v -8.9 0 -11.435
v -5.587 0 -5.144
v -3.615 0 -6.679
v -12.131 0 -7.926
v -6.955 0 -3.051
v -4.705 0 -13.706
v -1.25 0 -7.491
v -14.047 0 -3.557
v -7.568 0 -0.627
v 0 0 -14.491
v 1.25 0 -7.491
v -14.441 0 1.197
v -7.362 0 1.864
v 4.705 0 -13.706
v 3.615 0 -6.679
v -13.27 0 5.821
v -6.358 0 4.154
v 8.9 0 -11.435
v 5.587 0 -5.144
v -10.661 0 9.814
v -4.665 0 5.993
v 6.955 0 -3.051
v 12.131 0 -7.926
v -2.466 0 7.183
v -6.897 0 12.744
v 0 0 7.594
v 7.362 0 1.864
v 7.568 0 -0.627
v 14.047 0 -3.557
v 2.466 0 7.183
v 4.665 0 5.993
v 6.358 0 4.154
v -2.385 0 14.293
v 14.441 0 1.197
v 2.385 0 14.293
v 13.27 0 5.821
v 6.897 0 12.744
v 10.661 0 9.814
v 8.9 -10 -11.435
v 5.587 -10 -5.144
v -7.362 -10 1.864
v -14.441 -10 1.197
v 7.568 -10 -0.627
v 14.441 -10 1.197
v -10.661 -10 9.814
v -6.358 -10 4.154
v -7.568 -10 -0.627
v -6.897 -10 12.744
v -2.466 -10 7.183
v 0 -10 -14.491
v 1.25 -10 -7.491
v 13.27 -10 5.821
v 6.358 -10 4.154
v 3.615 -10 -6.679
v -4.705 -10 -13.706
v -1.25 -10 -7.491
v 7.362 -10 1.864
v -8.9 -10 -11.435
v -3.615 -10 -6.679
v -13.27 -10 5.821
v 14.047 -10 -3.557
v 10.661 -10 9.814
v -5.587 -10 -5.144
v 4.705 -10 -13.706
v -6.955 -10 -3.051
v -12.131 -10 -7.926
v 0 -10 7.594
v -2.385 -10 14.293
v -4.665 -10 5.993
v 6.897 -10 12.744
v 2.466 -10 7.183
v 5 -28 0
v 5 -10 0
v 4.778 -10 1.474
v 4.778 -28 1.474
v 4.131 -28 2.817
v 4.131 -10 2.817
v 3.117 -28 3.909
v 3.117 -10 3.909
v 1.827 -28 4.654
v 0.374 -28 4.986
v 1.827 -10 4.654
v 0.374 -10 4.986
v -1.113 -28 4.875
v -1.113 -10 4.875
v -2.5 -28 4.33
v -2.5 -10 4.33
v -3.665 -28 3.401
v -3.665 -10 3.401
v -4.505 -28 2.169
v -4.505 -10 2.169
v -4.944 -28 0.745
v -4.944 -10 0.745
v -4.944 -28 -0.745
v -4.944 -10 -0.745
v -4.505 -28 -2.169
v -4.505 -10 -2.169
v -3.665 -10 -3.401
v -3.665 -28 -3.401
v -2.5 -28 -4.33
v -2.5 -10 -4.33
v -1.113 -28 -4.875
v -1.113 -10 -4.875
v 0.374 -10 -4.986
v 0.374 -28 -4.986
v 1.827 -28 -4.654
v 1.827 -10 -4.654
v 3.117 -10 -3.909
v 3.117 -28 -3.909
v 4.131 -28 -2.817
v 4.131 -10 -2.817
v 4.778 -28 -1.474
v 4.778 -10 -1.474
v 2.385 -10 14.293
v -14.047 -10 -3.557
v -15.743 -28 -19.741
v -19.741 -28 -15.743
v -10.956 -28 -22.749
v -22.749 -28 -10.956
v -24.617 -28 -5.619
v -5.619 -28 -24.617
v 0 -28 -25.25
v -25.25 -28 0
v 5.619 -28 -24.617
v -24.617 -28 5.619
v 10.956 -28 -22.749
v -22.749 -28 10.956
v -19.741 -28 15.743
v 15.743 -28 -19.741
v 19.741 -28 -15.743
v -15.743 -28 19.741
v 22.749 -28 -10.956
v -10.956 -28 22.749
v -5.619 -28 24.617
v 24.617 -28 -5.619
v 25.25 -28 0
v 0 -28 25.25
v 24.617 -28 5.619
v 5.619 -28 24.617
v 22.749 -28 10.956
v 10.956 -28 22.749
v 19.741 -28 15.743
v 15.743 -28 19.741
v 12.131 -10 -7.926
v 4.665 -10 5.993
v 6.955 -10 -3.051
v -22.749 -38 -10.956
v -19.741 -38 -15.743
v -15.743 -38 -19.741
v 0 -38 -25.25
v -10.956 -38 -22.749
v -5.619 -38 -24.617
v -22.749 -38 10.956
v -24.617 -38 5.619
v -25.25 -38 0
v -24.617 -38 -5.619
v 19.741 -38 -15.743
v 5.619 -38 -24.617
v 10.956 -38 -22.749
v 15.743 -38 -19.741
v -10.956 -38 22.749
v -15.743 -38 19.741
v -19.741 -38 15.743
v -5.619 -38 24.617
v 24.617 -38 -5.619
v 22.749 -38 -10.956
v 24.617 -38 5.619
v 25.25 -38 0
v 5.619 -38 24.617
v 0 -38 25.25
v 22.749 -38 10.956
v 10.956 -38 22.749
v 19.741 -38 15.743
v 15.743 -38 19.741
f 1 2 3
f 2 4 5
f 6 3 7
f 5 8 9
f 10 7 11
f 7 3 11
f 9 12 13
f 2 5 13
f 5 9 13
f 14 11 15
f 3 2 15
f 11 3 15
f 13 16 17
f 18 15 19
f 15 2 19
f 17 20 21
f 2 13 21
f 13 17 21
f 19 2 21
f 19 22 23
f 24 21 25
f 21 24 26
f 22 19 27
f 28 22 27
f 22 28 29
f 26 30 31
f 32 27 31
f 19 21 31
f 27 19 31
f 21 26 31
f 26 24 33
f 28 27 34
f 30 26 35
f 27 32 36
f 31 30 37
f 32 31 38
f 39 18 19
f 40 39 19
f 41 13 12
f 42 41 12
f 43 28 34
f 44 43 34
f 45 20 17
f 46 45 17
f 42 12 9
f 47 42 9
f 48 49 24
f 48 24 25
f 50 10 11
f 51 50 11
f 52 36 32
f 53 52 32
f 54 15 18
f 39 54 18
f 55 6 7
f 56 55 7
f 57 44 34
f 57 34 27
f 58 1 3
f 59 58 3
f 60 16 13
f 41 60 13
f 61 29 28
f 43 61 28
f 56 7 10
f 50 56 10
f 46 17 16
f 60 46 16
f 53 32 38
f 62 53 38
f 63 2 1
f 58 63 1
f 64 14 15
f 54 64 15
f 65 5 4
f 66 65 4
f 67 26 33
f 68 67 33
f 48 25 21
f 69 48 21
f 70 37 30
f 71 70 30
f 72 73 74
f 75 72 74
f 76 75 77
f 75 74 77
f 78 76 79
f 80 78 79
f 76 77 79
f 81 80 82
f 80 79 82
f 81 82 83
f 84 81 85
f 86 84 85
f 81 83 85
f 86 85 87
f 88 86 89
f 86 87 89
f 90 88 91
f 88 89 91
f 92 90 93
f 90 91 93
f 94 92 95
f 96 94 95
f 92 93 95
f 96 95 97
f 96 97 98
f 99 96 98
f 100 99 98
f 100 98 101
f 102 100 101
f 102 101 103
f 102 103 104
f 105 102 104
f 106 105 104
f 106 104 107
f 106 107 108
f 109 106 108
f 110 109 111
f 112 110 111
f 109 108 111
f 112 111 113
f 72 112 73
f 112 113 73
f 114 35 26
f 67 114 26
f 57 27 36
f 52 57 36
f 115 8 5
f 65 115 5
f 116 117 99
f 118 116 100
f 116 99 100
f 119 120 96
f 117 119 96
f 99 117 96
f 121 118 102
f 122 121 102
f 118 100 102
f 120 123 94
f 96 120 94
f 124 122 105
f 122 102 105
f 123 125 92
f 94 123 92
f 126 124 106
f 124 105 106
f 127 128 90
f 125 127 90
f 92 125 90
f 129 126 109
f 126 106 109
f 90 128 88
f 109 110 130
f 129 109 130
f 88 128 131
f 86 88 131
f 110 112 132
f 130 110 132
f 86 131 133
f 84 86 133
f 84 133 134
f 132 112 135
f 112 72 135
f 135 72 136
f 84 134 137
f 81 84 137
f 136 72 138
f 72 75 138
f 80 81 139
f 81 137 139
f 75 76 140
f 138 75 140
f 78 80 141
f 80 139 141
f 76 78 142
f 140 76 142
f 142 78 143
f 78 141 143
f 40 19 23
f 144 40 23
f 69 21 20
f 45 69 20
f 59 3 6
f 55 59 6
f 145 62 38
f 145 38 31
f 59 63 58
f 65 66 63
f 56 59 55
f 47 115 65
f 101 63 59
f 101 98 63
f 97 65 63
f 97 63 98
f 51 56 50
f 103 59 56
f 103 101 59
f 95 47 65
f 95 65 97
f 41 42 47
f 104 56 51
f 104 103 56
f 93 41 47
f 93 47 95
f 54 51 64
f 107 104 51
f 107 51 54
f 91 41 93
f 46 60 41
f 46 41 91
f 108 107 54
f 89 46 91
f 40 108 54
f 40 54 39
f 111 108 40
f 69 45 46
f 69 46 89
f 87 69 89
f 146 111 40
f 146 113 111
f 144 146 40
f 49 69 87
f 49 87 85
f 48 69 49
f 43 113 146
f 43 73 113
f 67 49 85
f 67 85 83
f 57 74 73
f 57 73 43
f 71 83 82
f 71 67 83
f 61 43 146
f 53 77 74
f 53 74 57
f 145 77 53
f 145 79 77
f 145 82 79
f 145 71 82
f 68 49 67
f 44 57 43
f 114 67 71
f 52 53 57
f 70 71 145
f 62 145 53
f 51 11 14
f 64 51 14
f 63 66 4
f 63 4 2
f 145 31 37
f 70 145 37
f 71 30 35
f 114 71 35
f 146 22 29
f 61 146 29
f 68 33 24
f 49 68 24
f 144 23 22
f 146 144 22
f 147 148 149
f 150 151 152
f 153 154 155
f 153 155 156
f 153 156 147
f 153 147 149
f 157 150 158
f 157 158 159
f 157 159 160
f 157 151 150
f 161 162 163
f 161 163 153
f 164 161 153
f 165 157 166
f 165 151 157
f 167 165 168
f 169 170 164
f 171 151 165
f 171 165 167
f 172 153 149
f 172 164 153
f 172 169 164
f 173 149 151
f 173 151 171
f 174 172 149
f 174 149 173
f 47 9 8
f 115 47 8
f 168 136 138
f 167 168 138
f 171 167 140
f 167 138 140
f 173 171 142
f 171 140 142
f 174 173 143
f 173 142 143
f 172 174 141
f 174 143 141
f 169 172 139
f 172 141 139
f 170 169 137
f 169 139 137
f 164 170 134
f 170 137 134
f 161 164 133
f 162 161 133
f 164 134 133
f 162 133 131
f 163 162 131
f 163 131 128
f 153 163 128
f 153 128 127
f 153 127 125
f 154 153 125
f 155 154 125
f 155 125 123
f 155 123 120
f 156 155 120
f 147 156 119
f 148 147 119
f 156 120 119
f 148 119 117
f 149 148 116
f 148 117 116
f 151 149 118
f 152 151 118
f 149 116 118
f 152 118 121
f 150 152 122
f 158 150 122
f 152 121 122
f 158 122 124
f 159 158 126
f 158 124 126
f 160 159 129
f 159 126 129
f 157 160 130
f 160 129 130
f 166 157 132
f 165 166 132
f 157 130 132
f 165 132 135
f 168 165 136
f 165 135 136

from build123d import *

# Parameters (mm, degrees)
F1_DEPTH = 10
F2_R     = 5
F3_DEPTH = 18
F4_R     = 25.25
F4_R_2   = 5
F5_DEPTH = 10


with BuildPart() as f1:
    # F0 (on Front) → F1 (new body)
    with BuildSketch(Plane.XZ):
        Polygon((2.3851137612, 14.2932031622), (0, 7.5944172762), (-2.3851137612, 14.2932031622), (-2.4659032585, 7.1829308005), (-6.8968771988, 12.7443128177), (-4.6645876365, 5.9930623179), (-10.6612569758, 9.814378431), (-6.3577915656, 4.1537525412), (-13.270324133, 5.8209038555), (-7.3620301272, 1.8643192246), (-14.4413457601, 1.1966440267), (-7.5684784909, -0.6271420079), (-14.0474234935, -3.5572907503), (-6.954764773, -3.0506426728), (-12.1312449232, -7.9257378774), (-5.5873943777, -5.1435588684), (-8.9004577298, -11.4353083251), (-3.6145431043, -6.6790906501), (-4.7051678366, -13.7056856786), (-1.25, -7.4908393232), (0, -14.4908393232), (1.25, -7.4908393232), (4.7051678366, -13.7056856786), (3.6145431043, -6.6790906501), (8.9004577298, -11.4353083251), (5.5873943777, -5.1435588684), (12.1312449232, -7.9257378774), (6.954764773, -3.0506426728), (14.0474234935, -3.5572907503), (7.5684784909, -0.6271420079), (14.4413457601, 1.1966440267), (7.3620301272, 1.8643192246), (13.270324133, 5.8209038555), (6.3577915656, 4.1537525412), (10.6612569758, 9.814378431), (4.6645876365, 5.9930623179), (6.8968771988, 12.7443128177), (2.4659032585, 7.1829308005), align=None)
    extrude(amount=F1_DEPTH)

    # F2 (on face) → F3 (join)
    with BuildSketch(Plane.XZ.offset(10)):
        Circle(F2_R)
    extrude(amount=F3_DEPTH)

    # F4 (on face) → F5 (join)
    with BuildSketch(Plane.XZ.offset(28)):
        Circle(F4_R)
        Circle(F4_R_2, mode=Mode.SUBTRACT)
        Circle(F4_R_2)
    extrude(amount=F5_DEPTH)


solid = f1.part
